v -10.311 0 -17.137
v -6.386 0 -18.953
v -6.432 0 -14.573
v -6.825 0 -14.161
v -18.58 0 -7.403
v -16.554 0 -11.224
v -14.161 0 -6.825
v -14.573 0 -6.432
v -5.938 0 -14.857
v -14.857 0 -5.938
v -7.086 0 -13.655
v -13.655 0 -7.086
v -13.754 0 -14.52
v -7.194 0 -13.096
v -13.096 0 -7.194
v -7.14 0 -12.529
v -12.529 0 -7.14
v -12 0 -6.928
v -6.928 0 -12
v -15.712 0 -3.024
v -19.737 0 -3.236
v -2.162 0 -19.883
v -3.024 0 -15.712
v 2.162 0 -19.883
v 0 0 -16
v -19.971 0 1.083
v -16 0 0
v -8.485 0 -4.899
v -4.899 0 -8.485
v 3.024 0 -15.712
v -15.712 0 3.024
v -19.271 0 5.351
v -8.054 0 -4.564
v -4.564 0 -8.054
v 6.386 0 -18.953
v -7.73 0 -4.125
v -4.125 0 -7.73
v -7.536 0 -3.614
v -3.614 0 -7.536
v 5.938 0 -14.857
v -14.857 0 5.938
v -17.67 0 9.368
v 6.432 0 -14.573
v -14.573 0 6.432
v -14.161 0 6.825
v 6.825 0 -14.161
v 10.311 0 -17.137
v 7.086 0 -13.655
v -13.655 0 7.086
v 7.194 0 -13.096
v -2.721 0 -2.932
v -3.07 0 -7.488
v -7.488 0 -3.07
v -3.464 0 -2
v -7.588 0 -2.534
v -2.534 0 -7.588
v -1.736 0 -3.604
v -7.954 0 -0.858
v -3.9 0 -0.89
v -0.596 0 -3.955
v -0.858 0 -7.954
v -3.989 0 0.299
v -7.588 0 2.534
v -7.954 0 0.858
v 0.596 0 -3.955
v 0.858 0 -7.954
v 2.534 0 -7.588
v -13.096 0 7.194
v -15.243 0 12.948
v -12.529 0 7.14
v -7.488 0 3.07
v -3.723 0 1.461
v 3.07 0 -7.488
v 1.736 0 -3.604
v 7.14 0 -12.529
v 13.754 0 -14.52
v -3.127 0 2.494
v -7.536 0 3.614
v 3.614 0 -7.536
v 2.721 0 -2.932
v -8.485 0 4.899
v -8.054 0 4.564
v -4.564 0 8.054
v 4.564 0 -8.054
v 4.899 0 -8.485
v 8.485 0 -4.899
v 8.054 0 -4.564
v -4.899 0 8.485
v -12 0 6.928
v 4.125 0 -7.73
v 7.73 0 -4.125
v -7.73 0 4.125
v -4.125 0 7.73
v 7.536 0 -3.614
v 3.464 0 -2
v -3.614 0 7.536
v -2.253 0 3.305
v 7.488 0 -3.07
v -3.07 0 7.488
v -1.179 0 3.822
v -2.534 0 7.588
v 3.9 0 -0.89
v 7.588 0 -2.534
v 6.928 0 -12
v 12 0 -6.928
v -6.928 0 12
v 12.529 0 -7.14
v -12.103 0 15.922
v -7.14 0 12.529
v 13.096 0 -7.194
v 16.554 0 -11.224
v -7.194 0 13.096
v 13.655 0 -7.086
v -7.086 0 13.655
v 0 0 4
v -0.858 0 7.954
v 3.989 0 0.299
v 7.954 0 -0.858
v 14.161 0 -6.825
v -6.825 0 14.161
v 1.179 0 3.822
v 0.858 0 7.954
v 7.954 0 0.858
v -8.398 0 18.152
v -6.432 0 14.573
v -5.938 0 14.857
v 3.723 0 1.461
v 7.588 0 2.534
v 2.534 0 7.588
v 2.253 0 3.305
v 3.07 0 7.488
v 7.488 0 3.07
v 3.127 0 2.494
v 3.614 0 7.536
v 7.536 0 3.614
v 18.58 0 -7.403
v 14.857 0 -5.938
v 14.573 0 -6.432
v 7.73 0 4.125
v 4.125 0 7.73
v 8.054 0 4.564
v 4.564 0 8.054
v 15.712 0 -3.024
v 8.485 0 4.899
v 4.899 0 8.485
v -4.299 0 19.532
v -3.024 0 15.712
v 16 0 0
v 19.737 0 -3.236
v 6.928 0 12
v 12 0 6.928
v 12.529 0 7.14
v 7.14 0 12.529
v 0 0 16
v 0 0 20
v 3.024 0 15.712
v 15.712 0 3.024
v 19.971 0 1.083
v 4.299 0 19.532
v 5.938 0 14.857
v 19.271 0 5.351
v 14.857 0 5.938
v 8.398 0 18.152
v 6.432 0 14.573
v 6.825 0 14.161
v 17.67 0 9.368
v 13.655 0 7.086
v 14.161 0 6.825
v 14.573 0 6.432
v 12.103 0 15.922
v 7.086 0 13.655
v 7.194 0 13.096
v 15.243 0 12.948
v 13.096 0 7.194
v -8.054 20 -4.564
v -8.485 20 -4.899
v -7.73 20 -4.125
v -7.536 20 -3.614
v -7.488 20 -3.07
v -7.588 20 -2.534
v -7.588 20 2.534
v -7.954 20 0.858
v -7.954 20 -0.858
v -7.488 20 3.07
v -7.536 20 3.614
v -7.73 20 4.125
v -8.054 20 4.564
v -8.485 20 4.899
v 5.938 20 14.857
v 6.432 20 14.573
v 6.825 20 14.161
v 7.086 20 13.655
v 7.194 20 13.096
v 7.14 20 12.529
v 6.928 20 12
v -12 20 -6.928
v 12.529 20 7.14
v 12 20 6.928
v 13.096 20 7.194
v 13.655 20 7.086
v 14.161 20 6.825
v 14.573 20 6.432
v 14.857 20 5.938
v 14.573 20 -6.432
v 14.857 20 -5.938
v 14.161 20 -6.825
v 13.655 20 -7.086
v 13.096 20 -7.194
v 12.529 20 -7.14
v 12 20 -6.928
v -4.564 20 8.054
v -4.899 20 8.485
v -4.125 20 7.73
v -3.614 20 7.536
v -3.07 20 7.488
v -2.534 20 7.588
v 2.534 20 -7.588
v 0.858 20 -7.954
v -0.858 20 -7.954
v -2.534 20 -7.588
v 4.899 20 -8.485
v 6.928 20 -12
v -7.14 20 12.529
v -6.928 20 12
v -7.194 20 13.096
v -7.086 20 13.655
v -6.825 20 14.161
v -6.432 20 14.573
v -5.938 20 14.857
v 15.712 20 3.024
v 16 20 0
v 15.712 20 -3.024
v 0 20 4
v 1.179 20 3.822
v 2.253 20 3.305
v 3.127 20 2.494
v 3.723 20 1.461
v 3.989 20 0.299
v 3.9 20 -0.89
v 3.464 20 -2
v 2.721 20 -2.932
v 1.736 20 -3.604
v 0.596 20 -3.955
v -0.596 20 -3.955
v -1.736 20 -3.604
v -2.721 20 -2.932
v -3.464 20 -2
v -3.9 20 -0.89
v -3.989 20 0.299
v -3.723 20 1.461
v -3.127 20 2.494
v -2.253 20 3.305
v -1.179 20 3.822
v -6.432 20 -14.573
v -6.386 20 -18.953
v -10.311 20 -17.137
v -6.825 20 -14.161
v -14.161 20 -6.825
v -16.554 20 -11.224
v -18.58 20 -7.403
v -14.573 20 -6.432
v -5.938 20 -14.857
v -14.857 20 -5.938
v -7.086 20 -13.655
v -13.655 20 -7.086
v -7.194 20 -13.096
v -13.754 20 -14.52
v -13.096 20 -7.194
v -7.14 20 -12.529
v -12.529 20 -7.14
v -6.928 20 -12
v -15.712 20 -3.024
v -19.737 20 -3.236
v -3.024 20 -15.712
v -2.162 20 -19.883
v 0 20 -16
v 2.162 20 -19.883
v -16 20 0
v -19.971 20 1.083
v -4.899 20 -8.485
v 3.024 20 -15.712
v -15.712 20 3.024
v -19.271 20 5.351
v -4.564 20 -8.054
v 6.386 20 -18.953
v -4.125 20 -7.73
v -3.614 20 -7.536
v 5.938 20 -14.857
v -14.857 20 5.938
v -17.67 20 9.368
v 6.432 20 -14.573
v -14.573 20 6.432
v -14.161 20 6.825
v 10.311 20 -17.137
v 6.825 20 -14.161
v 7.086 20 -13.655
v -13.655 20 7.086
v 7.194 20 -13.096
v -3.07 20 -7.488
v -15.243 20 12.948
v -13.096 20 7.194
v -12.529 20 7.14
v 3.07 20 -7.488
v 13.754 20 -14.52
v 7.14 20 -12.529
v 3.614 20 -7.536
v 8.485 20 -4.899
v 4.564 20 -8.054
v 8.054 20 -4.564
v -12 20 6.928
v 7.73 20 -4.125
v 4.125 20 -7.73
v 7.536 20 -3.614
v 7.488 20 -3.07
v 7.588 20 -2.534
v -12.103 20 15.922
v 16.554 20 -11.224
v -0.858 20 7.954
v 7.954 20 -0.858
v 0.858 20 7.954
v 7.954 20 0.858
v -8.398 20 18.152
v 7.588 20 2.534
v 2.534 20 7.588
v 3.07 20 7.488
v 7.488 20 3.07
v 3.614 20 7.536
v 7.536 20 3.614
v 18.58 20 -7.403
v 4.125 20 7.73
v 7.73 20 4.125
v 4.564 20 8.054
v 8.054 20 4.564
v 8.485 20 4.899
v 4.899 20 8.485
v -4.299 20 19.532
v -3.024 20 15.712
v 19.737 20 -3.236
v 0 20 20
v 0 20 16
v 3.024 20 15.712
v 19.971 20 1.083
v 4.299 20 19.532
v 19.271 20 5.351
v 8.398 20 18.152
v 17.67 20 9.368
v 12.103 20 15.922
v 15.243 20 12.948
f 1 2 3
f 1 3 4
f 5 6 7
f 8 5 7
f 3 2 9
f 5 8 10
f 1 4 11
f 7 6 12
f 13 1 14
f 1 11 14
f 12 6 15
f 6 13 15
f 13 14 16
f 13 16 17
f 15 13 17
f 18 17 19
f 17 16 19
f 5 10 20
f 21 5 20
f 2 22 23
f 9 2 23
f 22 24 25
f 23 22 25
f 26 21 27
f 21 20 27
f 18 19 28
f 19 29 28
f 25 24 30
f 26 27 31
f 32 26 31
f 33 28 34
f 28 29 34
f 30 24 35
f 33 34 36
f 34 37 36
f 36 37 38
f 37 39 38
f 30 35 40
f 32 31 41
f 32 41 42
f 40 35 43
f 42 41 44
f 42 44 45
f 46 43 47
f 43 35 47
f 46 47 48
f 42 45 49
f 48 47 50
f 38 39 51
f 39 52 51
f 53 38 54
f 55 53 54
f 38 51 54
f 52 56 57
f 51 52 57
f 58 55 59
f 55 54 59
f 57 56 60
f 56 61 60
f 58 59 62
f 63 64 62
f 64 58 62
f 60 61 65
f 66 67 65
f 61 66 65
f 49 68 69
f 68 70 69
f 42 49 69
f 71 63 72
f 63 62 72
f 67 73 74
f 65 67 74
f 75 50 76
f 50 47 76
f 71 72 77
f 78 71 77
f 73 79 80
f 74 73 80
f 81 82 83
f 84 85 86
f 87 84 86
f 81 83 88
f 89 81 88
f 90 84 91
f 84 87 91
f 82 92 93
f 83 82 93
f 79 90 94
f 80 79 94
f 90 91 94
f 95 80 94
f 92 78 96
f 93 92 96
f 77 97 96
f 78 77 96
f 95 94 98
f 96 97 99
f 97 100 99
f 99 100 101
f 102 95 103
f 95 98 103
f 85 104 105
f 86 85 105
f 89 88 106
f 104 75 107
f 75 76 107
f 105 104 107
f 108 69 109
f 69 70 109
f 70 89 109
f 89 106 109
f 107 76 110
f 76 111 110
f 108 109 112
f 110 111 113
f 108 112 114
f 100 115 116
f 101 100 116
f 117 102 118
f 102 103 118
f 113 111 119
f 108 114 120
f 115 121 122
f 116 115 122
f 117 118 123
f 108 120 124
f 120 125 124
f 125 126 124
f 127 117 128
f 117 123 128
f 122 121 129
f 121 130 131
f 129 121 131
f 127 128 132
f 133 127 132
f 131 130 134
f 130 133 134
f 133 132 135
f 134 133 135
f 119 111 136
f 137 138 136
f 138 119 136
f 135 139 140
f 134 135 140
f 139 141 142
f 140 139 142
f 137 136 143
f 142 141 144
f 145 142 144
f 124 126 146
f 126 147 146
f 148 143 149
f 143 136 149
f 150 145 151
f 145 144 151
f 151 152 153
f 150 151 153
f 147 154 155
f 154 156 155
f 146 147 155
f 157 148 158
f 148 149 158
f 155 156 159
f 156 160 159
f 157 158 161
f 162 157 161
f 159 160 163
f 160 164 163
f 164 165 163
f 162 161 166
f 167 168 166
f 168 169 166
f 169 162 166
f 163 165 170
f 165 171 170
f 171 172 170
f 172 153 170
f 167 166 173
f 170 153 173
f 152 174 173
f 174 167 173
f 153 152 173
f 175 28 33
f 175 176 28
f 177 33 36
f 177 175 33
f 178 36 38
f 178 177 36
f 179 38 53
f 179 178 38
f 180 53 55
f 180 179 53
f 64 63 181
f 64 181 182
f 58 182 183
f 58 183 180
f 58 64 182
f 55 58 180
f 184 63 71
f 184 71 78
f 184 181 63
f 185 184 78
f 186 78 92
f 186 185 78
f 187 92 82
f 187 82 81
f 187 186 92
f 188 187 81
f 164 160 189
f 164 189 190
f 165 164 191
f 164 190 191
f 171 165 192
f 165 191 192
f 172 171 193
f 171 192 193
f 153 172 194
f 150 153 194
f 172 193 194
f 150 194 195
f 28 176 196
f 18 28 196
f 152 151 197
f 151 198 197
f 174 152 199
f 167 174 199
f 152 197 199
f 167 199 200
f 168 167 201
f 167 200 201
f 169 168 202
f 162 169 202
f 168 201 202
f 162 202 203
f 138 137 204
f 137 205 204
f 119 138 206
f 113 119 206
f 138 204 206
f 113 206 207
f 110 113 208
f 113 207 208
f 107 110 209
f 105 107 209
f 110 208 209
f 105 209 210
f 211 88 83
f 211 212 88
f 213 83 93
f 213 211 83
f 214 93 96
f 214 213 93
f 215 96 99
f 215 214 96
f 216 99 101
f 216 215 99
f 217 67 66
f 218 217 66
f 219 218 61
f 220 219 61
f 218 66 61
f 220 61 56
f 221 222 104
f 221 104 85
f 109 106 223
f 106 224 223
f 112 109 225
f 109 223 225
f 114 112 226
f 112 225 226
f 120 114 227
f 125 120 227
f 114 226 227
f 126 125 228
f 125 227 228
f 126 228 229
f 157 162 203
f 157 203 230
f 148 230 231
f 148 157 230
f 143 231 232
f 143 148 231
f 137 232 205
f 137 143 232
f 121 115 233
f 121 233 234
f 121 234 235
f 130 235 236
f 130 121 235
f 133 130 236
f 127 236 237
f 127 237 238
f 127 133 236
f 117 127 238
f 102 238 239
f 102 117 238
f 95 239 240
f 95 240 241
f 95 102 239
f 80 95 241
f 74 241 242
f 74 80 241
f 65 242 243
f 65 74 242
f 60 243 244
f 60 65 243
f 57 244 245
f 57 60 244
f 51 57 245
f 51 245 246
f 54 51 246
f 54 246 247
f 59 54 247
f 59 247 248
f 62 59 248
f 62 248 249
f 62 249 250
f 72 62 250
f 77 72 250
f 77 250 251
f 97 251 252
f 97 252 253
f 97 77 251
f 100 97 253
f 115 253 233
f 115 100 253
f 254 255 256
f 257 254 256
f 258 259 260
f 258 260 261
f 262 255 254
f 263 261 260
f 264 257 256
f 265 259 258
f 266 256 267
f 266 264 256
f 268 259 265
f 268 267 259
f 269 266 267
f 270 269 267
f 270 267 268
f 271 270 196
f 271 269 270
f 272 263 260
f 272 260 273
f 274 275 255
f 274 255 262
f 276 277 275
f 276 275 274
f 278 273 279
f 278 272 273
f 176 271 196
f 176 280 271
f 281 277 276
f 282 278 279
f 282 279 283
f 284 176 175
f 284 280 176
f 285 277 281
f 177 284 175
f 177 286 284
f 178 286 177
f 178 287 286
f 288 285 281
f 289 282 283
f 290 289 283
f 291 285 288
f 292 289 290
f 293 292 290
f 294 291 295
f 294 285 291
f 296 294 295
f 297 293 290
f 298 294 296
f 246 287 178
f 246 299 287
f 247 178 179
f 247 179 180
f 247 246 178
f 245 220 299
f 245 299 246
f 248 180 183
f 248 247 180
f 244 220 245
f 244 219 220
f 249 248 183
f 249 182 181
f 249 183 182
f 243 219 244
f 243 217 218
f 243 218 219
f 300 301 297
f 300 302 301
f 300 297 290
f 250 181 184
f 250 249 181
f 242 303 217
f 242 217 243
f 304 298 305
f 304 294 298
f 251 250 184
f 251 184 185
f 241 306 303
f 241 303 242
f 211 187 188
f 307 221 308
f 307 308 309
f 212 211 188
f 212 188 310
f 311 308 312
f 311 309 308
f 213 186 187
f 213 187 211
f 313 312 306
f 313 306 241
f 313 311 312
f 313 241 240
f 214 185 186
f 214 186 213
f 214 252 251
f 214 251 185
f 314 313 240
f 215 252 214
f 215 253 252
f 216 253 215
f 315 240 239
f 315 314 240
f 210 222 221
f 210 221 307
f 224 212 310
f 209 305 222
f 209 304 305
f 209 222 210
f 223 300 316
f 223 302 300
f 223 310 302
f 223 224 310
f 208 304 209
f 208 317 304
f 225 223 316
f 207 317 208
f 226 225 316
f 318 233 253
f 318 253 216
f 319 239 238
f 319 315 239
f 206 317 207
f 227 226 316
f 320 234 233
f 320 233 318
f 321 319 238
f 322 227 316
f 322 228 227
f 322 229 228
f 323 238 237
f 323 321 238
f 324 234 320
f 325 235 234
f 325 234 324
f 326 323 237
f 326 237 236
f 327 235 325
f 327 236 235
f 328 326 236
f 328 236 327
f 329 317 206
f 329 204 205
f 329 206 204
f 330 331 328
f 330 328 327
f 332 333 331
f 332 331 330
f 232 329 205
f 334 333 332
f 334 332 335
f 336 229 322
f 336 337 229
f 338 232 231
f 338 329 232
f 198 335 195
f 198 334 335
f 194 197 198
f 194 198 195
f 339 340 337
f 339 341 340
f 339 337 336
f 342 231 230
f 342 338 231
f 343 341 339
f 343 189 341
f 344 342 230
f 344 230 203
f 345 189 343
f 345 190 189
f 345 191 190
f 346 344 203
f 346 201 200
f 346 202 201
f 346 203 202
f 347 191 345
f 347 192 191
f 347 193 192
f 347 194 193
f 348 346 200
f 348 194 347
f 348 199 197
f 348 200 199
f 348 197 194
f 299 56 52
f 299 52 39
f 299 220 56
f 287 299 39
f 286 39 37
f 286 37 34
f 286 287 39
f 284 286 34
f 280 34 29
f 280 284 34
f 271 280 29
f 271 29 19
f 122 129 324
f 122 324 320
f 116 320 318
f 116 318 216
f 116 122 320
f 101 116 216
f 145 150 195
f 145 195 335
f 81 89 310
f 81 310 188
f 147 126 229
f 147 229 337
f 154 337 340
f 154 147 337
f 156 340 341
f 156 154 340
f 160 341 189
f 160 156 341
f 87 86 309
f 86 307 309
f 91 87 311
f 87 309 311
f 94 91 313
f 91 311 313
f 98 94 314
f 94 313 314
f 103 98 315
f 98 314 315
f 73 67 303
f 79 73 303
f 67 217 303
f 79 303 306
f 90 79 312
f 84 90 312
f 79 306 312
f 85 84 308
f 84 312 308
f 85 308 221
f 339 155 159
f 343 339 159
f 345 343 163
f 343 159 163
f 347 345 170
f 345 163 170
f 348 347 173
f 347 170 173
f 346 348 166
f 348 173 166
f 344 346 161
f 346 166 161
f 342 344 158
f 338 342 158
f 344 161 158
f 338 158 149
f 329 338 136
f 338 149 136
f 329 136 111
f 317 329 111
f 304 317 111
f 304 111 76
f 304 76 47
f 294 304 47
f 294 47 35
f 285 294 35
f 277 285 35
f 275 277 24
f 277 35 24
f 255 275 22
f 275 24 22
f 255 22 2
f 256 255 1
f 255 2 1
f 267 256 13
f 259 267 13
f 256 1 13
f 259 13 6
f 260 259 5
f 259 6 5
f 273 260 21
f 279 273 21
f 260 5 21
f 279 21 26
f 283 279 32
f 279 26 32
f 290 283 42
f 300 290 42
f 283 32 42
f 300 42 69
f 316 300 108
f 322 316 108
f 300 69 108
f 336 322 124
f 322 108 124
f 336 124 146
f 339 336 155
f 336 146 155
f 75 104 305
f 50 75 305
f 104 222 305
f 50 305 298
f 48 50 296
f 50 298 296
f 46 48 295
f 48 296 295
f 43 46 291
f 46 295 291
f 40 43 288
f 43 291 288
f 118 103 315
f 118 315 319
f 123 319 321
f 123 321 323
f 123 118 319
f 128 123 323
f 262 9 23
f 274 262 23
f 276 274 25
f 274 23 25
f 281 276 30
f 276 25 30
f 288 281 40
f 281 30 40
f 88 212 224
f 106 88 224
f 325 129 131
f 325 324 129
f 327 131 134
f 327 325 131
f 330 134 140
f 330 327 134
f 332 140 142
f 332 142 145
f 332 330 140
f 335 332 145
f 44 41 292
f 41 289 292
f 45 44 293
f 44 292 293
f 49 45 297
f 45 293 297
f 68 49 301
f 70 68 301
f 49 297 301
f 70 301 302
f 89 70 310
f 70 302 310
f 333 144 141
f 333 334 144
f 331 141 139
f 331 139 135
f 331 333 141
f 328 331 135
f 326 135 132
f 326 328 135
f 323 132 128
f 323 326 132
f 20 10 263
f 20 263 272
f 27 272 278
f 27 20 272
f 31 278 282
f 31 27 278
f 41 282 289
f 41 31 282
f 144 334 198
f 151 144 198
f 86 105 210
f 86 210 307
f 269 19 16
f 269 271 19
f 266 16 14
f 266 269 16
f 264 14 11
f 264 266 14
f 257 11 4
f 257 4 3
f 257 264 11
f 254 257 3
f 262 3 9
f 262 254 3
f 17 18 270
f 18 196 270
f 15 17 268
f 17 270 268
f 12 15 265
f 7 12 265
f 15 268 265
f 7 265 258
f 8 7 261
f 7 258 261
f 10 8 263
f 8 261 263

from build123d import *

# Parameters (mm, degrees)
SKETCH_1_R      = 20
SKETCH_1_R_2    = 4
EXTRUDE_1_DEPTH = 20
FILLET_1_R      = 2


with BuildPart() as part:
    # 草图1 → 凸台-拉伸1 (new body)
    with BuildSketch(Plane(origin=(0, 0, 0), x_dir=(1, 0, 0), z_dir=(0, 1, 0))):
        with Locations(Location((0, 0, 0), (0, 0, 270))):
            Circle(SKETCH_1_R)
        with Locations(Location((0, 0, 0), (0, 0, 270))):
            Circle(SKETCH_1_R_2, mode=Mode.SUBTRACT)
        with BuildLine():
            Line((-4, -6.92820323), (-8, -13.856406461))
            ThreePointArc((-8, -13.856406461), (0, -16), (8, -13.856406461))
            Line((8, -13.856406461), (4, -6.92820323))
            ThreePointArc((4, -6.92820323), (0, -8), (-4, -6.92820323))
        make_face(mode=Mode.SUBTRACT)
        with BuildLine():
            Line((-4, 6.92820323), (-8, 13.856406461))
            ThreePointArc((-8, 13.856406461), (0, 16), (8, 13.856406461))
            Line((8, 13.856406461), (4, 6.92820323))
            ThreePointArc((4, 6.92820323), (0, 8), (-4, 6.92820323))
        make_face(mode=Mode.SUBTRACT)
        with BuildLine():
            Line((-6.92820323, 4), (-13.856406461, 8))
            ThreePointArc((-13.856406461, 8), (-16, 0), (-13.856406461, -8))
            Line((-13.856406461, -8), (-6.92820323, -4))
            ThreePointArc((-6.92820323, -4), (-8, 0), (-6.92820323, 4))
        make_face(mode=Mode.SUBTRACT)
        with BuildLine():
            Line((6.92820323, -4), (13.856406461, -8))
            ThreePointArc((13.856406461, -8), (16, 0), (13.856406461, 8))
            Line((13.856406461, 8), (6.92820323, 4))
            ThreePointArc((6.92820323, 4), (8, 0), (6.92820323, -4))
        make_face(mode=Mode.SUBTRACT)
    extrude(amount=EXTRUDE_1_DEPTH)

    # 圆角1
    fillet_1_edges = [part.edges().sort_by_distance(p)[0] for p in [
        (8, 10, -13.856406461),
        (-8, 10, -13.856406461),
        (-4, 10, -6.92820323),
        (4, 10, -6.92820323),
        (13.856406461, 10, 8),
        (13.856406461, 10, -8),
        (6.92820323, 10, -4),
        (6.92820323, 10, 4),
        (-8, 10, 13.856406461),
        (8, 10, 13.856406461),
        (4, 10, 6.92820323),
        (-4, 10, 6.92820323),
        (-13.856406461, 10, -8),
        (-13.856406461, 10, 8),
        (-6.92820323, 10, 4),
        (-6.92820323, 10, -4),
    ]]
    fillet(fillet_1_edges, radius=FILLET_1_R)


solid = part.part
